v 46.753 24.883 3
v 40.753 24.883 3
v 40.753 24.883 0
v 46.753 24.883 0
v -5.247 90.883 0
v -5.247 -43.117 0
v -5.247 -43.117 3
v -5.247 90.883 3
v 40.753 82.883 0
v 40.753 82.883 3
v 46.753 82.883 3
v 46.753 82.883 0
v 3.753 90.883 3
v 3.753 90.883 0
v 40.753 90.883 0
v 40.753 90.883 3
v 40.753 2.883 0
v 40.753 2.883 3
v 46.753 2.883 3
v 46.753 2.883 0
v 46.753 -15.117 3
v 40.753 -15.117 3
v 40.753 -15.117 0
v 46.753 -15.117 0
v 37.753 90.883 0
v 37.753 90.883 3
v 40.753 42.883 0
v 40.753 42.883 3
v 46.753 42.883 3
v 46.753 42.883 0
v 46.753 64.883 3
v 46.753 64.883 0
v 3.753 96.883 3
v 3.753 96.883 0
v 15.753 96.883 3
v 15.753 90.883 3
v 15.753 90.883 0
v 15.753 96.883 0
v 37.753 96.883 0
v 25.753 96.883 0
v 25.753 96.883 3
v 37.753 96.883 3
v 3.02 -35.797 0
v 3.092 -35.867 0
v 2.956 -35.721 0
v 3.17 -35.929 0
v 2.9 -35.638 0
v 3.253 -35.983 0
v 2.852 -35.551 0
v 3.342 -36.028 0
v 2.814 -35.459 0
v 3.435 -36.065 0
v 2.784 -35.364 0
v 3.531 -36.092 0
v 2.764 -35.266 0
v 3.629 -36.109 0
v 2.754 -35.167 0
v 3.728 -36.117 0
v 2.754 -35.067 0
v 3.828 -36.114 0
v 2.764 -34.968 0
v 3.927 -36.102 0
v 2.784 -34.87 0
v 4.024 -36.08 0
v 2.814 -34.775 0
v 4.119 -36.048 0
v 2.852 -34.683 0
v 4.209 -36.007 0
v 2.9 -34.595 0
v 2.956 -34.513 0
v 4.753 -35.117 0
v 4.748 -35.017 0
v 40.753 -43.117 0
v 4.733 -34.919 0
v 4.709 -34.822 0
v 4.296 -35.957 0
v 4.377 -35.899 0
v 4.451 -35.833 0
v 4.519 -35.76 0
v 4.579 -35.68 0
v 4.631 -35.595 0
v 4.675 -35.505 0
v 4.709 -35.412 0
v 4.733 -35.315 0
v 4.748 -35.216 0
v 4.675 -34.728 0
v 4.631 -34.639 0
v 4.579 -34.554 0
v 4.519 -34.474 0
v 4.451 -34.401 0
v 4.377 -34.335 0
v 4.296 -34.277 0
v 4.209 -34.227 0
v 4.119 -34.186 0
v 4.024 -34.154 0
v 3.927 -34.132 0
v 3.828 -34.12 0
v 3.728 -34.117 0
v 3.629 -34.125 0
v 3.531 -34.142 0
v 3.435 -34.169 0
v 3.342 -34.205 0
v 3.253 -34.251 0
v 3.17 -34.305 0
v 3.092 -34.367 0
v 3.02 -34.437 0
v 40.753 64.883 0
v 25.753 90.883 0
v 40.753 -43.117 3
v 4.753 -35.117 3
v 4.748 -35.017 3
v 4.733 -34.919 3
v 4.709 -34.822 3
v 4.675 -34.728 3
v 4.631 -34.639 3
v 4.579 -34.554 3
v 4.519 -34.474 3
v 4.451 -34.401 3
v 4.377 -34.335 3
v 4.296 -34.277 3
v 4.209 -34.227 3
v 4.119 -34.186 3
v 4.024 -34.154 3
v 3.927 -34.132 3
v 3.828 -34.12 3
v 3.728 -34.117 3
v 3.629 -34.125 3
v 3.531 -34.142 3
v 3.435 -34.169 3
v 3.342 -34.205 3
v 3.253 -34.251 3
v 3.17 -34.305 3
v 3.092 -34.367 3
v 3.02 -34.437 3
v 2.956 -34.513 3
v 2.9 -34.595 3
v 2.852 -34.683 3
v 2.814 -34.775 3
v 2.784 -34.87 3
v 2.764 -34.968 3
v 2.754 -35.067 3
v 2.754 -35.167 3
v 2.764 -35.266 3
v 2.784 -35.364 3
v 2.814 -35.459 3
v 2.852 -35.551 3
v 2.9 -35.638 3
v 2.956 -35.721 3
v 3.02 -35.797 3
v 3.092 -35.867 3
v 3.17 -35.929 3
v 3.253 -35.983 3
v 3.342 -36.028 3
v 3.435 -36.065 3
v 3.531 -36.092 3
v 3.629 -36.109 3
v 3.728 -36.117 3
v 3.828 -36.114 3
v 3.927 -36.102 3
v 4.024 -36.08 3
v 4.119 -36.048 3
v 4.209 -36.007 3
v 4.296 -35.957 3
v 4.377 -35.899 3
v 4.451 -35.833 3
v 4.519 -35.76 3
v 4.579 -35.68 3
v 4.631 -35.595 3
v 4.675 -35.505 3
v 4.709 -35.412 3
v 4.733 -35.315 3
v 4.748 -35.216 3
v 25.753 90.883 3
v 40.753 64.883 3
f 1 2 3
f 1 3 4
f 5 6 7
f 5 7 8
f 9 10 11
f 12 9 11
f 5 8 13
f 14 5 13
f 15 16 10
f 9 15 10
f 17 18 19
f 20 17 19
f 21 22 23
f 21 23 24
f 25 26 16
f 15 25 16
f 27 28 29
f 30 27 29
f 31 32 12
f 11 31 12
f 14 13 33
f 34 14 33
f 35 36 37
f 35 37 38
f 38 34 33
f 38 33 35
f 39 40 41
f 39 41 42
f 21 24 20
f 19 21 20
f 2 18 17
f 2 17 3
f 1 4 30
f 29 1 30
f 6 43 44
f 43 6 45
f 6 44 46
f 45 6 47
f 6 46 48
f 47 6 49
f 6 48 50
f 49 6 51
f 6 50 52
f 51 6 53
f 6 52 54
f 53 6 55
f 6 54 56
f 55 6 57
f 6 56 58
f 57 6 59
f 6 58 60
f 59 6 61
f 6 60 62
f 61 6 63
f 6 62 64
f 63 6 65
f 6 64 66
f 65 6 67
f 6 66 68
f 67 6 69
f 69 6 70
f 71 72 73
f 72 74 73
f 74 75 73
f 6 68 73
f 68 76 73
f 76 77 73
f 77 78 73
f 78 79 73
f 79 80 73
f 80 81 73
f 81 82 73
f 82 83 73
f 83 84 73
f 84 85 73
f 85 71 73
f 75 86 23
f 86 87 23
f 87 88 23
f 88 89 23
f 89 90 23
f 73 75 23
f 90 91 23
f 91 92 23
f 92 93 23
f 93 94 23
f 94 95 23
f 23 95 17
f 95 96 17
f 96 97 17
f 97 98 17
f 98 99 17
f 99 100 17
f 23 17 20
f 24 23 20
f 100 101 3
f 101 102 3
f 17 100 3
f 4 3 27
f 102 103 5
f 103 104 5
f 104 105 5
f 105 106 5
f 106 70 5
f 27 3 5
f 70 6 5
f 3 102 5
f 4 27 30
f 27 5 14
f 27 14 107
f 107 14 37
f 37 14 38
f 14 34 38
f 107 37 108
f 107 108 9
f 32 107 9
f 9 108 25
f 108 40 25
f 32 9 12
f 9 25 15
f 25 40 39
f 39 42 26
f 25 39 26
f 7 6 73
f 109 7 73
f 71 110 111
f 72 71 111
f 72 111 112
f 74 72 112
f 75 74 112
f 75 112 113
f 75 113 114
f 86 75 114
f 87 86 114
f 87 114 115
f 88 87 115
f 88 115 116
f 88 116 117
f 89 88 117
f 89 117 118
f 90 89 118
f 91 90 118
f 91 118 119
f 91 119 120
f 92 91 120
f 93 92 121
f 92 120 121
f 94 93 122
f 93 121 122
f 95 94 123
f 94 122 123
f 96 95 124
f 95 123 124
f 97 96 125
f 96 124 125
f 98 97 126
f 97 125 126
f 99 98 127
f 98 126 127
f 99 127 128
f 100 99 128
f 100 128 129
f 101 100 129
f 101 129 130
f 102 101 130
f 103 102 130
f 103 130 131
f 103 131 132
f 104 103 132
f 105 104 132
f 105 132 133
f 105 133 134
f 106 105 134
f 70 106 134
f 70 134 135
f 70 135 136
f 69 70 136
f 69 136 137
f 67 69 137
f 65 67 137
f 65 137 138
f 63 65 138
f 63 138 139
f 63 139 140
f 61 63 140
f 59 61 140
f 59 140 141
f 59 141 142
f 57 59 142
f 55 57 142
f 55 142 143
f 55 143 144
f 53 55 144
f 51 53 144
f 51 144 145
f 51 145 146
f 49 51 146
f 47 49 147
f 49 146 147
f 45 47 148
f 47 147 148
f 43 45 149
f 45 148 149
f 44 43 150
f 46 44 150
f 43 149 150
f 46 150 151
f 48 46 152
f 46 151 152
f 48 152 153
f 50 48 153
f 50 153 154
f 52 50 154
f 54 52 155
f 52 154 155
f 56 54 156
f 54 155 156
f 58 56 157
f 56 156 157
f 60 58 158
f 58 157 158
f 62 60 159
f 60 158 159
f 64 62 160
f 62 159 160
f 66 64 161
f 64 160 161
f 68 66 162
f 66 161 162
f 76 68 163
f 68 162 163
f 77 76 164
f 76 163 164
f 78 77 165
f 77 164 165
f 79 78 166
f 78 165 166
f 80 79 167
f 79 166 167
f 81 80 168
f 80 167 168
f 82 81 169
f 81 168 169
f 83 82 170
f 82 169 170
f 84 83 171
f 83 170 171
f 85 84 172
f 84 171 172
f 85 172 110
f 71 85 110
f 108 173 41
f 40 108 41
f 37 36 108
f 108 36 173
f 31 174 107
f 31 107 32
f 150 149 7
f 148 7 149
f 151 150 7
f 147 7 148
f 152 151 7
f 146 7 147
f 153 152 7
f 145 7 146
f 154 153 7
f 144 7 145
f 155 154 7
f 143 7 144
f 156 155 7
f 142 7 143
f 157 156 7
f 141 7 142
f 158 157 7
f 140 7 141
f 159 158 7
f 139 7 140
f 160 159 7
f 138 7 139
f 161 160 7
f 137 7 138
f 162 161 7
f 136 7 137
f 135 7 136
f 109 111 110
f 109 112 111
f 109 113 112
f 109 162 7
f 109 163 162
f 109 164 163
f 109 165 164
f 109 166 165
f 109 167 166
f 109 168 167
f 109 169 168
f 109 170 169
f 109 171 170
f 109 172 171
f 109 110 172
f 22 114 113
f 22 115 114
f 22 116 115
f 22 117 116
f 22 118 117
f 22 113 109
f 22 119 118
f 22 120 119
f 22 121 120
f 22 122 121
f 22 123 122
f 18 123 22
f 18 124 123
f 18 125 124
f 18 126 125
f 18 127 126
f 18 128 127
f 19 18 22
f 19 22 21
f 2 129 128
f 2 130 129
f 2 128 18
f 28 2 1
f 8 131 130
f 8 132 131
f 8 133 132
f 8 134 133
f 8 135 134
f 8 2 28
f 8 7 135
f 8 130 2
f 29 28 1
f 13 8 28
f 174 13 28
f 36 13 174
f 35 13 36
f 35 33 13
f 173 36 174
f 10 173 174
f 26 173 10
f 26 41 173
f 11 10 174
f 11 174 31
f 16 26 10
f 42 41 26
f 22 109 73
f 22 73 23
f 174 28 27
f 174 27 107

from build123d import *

# Parameters (mm, degrees)
ESQUISSE1_W             = 52
ESQUISSE1_H             = 140
BOSS_EXTRU_1_DEPTH      = 3
ESQUISSE2_R             = 1
ESQUISSE2_W             = 9
ESQUISSE2_H             = 6
ESQUISSE2_W_2           = 10
ESQUISSE2_W_3           = 6
ESQUISSE2_H_2           = 22
ESQUISSE2_H_3           = 27.999999716
ENL_V_MAT_EXTRU_1_DEPTH = 108.616004474


with BuildPart() as part:
    # Esquisse1 → Boss.-Extru.1 (new body)
    with BuildSketch(Plane.XY):
        with Locations((20.753246753, 26.883116883)):
            Rectangle(ESQUISSE1_W, ESQUISSE1_H)
    extrude(amount=BOSS_EXTRU_1_DEPTH)

    # Esquisse2 → Enlèv. mat.-Extru.1 (cut, through all)
    with BuildSketch(Plane.XY.offset(3)):
        with Locations((3.753246753, -35.116883117)):
            Circle(ESQUISSE2_R)
        with Locations((-0.746753247, 93.883116883)):
            Rectangle(ESQUISSE2_W, ESQUISSE2_H)
        with Locations((20.753246753, 93.883116883)):
            Rectangle(ESQUISSE2_W_2, ESQUISSE2_H)
        Polygon((37.753246753, 96.883116883), (37.753246753, 90.883116883), (40.753246753, 90.883116883), (40.753246753, 82.883116599), (46.753246753, 82.883116599), (46.753246753, 96.883116883), align=None)
        with Locations((43.753246753, 53.883116599)):
            Rectangle(ESQUISSE2_W_3, ESQUISSE2_H_2)
        with Locations((43.753246753, 13.883116599)):
            Rectangle(ESQUISSE2_W_3, ESQUISSE2_H_2)
        with Locations((43.753246753, -29.116883259)):
            Rectangle(ESQUISSE2_W_3, ESQUISSE2_H_3)
    extrude(amount=-ENL_V_MAT_EXTRU_1_DEPTH, mode=Mode.SUBTRACT)


solid = part.part
